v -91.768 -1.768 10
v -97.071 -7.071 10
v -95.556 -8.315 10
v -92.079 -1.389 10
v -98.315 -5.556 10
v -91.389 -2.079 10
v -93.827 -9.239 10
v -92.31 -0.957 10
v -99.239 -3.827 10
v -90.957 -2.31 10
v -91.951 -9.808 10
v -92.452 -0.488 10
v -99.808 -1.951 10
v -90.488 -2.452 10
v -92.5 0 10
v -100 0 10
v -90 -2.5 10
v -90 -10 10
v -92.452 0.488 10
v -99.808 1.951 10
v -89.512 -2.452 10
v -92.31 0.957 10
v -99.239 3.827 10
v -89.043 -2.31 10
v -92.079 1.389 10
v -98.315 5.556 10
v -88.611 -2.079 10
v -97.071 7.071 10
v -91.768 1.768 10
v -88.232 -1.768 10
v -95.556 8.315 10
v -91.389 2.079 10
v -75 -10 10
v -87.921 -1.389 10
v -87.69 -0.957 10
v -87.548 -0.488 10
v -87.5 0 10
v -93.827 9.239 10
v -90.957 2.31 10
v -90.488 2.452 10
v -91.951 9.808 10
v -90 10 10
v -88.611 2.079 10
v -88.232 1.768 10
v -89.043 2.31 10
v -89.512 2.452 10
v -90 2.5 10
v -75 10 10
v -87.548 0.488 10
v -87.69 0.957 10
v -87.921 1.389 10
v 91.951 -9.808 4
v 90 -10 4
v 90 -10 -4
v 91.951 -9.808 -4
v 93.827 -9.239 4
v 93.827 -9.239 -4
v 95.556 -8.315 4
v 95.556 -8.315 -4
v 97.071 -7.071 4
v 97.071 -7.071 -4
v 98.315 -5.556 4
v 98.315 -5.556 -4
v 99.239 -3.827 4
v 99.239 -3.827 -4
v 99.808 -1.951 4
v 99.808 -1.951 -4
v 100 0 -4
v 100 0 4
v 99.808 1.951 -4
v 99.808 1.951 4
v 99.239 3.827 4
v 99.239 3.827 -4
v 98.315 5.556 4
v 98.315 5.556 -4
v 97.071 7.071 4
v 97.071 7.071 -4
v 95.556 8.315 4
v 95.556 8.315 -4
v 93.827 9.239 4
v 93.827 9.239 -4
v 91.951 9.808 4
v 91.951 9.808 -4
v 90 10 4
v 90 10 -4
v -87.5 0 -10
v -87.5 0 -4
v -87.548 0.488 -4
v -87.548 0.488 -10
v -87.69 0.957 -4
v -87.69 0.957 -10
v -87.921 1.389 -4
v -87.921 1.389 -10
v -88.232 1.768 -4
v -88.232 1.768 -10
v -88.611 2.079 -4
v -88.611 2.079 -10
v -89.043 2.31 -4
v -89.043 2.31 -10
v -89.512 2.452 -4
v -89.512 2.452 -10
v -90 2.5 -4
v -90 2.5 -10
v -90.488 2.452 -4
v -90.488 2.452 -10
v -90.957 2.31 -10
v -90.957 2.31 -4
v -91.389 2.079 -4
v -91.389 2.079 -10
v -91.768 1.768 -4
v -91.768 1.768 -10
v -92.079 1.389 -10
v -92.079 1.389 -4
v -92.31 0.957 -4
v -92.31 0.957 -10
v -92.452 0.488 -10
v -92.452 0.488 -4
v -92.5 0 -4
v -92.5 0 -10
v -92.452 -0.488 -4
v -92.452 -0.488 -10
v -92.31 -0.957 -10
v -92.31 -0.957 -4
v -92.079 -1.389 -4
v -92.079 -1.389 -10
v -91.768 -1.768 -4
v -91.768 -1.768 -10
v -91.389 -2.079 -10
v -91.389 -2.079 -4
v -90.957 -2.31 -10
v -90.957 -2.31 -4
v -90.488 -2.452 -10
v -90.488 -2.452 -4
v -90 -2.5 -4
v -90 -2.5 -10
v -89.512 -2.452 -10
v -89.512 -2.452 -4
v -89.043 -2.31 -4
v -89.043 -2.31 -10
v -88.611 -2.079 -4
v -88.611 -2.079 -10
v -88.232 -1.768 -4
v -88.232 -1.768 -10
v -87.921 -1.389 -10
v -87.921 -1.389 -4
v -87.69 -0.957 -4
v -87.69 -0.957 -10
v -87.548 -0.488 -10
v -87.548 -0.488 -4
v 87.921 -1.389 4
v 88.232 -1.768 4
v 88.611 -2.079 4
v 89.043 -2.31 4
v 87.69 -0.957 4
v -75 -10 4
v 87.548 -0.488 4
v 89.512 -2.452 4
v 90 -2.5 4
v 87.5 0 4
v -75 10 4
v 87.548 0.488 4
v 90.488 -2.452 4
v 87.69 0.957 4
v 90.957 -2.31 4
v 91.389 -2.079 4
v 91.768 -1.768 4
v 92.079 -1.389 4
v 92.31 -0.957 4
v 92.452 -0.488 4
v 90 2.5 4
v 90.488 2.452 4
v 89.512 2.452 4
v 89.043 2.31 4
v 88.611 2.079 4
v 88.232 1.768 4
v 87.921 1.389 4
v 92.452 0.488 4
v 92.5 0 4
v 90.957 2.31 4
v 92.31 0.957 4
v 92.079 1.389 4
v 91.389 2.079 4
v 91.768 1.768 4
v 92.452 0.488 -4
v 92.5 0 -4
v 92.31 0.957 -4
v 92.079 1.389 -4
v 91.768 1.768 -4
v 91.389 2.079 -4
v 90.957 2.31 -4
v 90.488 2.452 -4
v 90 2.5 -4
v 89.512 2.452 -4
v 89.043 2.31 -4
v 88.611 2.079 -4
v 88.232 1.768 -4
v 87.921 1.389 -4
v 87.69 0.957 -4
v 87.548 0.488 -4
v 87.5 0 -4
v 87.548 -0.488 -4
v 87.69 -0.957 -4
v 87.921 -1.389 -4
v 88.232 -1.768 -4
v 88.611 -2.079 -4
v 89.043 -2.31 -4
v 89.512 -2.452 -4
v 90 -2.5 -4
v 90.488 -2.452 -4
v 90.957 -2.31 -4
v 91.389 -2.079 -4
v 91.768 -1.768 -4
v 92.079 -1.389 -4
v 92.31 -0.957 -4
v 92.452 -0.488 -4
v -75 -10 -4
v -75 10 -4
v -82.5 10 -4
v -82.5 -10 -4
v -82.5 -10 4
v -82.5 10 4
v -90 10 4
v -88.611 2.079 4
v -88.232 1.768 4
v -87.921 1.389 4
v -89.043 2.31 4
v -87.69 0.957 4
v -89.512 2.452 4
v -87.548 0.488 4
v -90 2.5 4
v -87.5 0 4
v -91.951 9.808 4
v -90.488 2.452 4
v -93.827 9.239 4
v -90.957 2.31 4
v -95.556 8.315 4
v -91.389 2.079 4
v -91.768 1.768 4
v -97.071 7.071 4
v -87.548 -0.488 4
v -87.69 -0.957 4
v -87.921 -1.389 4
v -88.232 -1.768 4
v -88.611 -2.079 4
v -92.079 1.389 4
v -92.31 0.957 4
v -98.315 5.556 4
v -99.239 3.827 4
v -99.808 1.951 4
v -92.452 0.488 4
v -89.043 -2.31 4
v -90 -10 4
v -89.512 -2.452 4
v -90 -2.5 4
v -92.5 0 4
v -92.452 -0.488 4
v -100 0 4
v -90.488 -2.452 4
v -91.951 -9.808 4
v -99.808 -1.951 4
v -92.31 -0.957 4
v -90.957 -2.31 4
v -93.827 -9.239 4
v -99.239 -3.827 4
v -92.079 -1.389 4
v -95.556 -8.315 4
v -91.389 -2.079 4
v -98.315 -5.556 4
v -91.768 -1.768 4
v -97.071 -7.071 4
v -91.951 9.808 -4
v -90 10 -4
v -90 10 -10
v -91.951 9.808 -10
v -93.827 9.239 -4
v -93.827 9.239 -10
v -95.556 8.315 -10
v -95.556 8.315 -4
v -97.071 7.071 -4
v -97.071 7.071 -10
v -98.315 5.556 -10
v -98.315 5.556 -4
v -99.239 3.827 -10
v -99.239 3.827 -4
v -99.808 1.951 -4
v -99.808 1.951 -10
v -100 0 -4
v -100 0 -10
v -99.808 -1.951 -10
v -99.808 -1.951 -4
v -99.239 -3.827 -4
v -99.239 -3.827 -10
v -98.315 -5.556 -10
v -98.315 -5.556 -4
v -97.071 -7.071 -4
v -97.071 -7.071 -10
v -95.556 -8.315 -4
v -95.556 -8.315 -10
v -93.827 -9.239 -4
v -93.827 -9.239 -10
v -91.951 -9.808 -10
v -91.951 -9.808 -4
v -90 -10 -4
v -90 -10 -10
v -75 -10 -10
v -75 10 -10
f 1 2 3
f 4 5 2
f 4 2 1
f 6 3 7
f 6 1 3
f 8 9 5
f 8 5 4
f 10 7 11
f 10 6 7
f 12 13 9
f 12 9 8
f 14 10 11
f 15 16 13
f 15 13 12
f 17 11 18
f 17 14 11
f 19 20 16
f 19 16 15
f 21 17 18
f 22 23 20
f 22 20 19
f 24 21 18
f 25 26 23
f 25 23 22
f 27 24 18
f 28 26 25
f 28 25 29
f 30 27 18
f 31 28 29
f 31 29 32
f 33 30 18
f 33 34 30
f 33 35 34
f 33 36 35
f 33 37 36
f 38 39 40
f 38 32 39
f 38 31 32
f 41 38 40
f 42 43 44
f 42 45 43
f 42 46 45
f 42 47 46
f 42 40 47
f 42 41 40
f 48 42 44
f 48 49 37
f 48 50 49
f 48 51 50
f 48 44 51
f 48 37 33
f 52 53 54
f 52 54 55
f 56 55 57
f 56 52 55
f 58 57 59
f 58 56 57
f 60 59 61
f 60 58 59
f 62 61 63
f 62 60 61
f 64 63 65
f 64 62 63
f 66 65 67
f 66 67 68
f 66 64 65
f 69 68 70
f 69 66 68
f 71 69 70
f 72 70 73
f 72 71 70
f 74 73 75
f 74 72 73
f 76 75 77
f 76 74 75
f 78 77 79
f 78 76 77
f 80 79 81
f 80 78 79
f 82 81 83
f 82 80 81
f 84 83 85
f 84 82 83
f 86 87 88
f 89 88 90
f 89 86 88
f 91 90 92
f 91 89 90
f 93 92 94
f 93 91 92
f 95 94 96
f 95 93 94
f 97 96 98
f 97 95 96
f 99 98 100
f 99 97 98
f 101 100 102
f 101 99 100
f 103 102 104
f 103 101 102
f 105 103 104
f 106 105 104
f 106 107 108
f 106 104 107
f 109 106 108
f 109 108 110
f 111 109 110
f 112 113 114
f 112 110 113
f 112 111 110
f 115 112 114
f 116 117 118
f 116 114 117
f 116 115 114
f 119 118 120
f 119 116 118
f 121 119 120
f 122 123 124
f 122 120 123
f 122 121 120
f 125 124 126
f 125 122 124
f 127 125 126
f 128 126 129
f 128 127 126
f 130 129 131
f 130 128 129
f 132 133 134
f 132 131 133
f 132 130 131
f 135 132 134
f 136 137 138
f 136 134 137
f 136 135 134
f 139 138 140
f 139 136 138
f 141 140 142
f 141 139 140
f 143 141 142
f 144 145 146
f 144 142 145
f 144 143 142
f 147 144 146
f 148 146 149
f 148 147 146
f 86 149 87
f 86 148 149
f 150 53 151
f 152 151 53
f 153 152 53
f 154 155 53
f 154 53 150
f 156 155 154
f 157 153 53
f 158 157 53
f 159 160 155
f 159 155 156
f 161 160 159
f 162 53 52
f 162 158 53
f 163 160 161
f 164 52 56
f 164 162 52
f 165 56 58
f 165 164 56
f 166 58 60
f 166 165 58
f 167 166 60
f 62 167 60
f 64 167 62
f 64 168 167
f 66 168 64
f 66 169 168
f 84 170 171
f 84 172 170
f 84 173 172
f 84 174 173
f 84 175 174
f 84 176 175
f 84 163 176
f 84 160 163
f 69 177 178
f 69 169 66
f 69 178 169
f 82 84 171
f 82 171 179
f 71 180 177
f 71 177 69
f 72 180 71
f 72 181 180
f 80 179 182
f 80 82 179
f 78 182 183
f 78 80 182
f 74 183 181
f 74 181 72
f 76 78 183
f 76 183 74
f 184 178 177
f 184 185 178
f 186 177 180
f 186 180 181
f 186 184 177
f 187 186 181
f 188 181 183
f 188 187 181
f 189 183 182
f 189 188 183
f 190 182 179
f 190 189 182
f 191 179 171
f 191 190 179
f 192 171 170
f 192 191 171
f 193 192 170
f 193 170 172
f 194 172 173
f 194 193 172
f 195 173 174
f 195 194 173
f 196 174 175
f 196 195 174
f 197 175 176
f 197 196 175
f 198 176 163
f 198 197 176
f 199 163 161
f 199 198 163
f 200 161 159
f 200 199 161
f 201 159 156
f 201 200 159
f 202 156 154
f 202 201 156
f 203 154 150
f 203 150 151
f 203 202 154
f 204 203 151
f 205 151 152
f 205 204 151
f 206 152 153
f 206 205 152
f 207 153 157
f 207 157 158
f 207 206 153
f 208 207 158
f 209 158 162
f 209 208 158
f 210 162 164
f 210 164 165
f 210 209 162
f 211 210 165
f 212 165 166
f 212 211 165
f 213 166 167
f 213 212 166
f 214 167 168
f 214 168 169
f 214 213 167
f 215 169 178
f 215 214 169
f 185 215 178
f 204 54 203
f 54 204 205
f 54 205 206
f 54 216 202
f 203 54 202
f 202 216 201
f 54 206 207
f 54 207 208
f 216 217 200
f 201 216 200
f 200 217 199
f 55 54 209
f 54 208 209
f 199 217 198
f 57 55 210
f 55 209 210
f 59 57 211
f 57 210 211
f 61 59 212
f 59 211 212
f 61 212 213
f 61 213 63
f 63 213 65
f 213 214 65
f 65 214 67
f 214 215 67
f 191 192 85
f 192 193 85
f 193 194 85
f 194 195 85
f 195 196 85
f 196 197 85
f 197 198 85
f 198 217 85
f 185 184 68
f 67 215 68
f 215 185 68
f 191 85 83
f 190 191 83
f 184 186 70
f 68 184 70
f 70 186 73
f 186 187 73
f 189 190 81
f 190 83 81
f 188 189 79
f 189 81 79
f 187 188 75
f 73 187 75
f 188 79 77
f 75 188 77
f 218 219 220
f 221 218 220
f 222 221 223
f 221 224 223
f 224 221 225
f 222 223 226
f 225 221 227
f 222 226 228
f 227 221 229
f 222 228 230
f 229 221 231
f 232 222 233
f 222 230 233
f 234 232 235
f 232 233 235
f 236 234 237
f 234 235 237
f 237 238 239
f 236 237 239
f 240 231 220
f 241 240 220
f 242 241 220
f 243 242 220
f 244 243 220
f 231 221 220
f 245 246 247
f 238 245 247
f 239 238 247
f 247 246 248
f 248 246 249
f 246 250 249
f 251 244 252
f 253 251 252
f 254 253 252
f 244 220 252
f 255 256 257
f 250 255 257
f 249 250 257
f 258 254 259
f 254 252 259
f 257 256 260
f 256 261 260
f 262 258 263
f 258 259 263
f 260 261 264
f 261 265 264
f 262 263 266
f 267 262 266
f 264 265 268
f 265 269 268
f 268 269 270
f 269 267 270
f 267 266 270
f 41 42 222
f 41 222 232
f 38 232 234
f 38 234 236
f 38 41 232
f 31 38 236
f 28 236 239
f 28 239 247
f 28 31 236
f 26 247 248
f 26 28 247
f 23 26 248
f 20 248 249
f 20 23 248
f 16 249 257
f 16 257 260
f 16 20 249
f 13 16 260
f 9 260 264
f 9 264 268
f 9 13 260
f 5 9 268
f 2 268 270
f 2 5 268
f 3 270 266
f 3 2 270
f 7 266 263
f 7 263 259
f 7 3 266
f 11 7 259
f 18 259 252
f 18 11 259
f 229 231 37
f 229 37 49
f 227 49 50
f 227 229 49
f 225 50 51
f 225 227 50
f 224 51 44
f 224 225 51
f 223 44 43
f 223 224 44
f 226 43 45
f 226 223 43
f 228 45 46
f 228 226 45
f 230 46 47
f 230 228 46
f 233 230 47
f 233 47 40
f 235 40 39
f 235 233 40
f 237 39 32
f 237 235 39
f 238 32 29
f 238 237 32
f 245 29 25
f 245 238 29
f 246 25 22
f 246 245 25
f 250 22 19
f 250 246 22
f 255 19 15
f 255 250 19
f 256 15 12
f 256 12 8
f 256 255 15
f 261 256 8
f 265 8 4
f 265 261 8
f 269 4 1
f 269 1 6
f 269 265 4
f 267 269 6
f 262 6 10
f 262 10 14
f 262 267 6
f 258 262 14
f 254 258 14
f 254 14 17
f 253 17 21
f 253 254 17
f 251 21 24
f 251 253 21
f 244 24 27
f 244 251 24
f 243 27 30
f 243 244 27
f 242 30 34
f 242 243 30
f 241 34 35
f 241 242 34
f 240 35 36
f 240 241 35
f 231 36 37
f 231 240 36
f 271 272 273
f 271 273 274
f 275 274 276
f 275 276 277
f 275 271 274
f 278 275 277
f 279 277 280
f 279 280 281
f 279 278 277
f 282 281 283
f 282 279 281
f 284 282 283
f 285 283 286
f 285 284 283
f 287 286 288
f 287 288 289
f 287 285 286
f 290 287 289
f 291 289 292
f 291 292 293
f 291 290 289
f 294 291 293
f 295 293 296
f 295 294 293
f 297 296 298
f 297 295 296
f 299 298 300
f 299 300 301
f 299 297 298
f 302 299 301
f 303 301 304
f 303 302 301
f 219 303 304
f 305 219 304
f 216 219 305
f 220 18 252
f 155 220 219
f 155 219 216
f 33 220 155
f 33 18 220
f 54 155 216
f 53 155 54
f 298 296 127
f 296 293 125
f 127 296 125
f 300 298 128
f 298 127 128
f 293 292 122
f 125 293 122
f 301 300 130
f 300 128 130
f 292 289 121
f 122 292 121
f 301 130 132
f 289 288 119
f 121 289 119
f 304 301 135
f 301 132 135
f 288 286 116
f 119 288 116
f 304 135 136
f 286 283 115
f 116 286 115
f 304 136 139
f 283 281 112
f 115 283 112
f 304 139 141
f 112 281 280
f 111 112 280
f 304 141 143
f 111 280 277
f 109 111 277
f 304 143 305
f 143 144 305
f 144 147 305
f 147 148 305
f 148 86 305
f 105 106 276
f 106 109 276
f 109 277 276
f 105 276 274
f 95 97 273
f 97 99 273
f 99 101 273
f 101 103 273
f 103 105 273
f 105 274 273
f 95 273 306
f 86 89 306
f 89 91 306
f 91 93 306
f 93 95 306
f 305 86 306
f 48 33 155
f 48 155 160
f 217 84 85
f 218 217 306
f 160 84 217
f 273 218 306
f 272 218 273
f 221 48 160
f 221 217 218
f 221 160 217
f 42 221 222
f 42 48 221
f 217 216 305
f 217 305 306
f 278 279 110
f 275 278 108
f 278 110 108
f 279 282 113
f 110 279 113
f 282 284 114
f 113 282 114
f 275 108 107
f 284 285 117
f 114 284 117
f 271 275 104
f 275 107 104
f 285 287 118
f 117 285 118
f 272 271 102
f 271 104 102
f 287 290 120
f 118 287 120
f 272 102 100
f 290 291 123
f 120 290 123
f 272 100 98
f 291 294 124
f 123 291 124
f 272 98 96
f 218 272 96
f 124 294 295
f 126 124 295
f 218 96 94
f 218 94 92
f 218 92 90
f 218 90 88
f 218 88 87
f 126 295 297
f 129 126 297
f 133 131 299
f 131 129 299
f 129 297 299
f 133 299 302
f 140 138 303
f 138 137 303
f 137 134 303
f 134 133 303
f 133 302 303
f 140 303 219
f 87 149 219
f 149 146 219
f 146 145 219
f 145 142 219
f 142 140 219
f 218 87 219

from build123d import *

# Parameters (mm, degrees)
F0_W     = 150
F0_H     = 20
F0_R     = 2.5
F1_DEPTH = 4
F2_DEPTH = 10
F3_W     = 7.5
F3_H     = 8
F3_W_2   = 10.5527898669
F4_DEPTH = 25


# Not quite as in the source:
# - a feature names something its author has since deleted; it is built from what else it names


with BuildPart() as f1:
    # F0 (on Top) → F1 (new body, symmetric)
    with BuildSketch(Plane.XY):
        Rectangle(F0_W, F0_H)
        with BuildLine():
            Line((90, 10), (75, 10))
            Line((75, 10), (75, -10))
            Line((75, -10), (90, -10))
            ThreePointArc((90, -10), (80, 0), (90, 10))
        make_face()
        with BuildLine():
            ThreePointArc((100, 0), (97.0710678119, 7.0710678119), (90, 10))
            ThreePointArc((90, 10), (80, 0), (90, -10))
            ThreePointArc((90, -10), (97.0710678119, -7.0710678119), (100, 0))
        make_face()
        with Locations((90, 0)):
            Circle(F0_R, mode=Mode.SUBTRACT)
    extrude(amount=F1_DEPTH, both=True)

    # F0 (on Top) → F2 (join, symmetric)
    with BuildSketch(Plane.XY):
        with BuildLine():
            ThreePointArc((-80, 0), (-82.9289321881, 7.0710678119), (-90, 10))
            ThreePointArc((-90, 10), (-100, 0), (-90, -10))
            ThreePointArc((-90, -10), (-82.9289321881, -7.0710678119), (-80, 0))
        make_face()
        with Locations((-90, 0)):
            Circle(F0_R, mode=Mode.SUBTRACT)
        with BuildLine():
            Line((-75, -10), (-75, 10))
            Line((-75, 10), (-90, 10))
            ThreePointArc((-90, 10), (-82.9289321881, 7.0710678119), (-80, 0))
            ThreePointArc((-80, 0), (-82.9289321881, -7.0710678119), (-90, -10))
            Line((-90, -10), (-75, -10))
        make_face()
    extrude(amount=F2_DEPTH, both=True)

    # F3 (on face) → F4 (cut)
    with BuildSketch(Plane.XZ.offset(10)):
        with Locations((-86.25, 0)):
            Rectangle(F3_W, F3_H)
        with Locations((-95.2763949335, 0)):
            Rectangle(F3_W_2, F3_H)
    extrude(amount=-F4_DEPTH, mode=Mode.SUBTRACT)


solid = f1.part
